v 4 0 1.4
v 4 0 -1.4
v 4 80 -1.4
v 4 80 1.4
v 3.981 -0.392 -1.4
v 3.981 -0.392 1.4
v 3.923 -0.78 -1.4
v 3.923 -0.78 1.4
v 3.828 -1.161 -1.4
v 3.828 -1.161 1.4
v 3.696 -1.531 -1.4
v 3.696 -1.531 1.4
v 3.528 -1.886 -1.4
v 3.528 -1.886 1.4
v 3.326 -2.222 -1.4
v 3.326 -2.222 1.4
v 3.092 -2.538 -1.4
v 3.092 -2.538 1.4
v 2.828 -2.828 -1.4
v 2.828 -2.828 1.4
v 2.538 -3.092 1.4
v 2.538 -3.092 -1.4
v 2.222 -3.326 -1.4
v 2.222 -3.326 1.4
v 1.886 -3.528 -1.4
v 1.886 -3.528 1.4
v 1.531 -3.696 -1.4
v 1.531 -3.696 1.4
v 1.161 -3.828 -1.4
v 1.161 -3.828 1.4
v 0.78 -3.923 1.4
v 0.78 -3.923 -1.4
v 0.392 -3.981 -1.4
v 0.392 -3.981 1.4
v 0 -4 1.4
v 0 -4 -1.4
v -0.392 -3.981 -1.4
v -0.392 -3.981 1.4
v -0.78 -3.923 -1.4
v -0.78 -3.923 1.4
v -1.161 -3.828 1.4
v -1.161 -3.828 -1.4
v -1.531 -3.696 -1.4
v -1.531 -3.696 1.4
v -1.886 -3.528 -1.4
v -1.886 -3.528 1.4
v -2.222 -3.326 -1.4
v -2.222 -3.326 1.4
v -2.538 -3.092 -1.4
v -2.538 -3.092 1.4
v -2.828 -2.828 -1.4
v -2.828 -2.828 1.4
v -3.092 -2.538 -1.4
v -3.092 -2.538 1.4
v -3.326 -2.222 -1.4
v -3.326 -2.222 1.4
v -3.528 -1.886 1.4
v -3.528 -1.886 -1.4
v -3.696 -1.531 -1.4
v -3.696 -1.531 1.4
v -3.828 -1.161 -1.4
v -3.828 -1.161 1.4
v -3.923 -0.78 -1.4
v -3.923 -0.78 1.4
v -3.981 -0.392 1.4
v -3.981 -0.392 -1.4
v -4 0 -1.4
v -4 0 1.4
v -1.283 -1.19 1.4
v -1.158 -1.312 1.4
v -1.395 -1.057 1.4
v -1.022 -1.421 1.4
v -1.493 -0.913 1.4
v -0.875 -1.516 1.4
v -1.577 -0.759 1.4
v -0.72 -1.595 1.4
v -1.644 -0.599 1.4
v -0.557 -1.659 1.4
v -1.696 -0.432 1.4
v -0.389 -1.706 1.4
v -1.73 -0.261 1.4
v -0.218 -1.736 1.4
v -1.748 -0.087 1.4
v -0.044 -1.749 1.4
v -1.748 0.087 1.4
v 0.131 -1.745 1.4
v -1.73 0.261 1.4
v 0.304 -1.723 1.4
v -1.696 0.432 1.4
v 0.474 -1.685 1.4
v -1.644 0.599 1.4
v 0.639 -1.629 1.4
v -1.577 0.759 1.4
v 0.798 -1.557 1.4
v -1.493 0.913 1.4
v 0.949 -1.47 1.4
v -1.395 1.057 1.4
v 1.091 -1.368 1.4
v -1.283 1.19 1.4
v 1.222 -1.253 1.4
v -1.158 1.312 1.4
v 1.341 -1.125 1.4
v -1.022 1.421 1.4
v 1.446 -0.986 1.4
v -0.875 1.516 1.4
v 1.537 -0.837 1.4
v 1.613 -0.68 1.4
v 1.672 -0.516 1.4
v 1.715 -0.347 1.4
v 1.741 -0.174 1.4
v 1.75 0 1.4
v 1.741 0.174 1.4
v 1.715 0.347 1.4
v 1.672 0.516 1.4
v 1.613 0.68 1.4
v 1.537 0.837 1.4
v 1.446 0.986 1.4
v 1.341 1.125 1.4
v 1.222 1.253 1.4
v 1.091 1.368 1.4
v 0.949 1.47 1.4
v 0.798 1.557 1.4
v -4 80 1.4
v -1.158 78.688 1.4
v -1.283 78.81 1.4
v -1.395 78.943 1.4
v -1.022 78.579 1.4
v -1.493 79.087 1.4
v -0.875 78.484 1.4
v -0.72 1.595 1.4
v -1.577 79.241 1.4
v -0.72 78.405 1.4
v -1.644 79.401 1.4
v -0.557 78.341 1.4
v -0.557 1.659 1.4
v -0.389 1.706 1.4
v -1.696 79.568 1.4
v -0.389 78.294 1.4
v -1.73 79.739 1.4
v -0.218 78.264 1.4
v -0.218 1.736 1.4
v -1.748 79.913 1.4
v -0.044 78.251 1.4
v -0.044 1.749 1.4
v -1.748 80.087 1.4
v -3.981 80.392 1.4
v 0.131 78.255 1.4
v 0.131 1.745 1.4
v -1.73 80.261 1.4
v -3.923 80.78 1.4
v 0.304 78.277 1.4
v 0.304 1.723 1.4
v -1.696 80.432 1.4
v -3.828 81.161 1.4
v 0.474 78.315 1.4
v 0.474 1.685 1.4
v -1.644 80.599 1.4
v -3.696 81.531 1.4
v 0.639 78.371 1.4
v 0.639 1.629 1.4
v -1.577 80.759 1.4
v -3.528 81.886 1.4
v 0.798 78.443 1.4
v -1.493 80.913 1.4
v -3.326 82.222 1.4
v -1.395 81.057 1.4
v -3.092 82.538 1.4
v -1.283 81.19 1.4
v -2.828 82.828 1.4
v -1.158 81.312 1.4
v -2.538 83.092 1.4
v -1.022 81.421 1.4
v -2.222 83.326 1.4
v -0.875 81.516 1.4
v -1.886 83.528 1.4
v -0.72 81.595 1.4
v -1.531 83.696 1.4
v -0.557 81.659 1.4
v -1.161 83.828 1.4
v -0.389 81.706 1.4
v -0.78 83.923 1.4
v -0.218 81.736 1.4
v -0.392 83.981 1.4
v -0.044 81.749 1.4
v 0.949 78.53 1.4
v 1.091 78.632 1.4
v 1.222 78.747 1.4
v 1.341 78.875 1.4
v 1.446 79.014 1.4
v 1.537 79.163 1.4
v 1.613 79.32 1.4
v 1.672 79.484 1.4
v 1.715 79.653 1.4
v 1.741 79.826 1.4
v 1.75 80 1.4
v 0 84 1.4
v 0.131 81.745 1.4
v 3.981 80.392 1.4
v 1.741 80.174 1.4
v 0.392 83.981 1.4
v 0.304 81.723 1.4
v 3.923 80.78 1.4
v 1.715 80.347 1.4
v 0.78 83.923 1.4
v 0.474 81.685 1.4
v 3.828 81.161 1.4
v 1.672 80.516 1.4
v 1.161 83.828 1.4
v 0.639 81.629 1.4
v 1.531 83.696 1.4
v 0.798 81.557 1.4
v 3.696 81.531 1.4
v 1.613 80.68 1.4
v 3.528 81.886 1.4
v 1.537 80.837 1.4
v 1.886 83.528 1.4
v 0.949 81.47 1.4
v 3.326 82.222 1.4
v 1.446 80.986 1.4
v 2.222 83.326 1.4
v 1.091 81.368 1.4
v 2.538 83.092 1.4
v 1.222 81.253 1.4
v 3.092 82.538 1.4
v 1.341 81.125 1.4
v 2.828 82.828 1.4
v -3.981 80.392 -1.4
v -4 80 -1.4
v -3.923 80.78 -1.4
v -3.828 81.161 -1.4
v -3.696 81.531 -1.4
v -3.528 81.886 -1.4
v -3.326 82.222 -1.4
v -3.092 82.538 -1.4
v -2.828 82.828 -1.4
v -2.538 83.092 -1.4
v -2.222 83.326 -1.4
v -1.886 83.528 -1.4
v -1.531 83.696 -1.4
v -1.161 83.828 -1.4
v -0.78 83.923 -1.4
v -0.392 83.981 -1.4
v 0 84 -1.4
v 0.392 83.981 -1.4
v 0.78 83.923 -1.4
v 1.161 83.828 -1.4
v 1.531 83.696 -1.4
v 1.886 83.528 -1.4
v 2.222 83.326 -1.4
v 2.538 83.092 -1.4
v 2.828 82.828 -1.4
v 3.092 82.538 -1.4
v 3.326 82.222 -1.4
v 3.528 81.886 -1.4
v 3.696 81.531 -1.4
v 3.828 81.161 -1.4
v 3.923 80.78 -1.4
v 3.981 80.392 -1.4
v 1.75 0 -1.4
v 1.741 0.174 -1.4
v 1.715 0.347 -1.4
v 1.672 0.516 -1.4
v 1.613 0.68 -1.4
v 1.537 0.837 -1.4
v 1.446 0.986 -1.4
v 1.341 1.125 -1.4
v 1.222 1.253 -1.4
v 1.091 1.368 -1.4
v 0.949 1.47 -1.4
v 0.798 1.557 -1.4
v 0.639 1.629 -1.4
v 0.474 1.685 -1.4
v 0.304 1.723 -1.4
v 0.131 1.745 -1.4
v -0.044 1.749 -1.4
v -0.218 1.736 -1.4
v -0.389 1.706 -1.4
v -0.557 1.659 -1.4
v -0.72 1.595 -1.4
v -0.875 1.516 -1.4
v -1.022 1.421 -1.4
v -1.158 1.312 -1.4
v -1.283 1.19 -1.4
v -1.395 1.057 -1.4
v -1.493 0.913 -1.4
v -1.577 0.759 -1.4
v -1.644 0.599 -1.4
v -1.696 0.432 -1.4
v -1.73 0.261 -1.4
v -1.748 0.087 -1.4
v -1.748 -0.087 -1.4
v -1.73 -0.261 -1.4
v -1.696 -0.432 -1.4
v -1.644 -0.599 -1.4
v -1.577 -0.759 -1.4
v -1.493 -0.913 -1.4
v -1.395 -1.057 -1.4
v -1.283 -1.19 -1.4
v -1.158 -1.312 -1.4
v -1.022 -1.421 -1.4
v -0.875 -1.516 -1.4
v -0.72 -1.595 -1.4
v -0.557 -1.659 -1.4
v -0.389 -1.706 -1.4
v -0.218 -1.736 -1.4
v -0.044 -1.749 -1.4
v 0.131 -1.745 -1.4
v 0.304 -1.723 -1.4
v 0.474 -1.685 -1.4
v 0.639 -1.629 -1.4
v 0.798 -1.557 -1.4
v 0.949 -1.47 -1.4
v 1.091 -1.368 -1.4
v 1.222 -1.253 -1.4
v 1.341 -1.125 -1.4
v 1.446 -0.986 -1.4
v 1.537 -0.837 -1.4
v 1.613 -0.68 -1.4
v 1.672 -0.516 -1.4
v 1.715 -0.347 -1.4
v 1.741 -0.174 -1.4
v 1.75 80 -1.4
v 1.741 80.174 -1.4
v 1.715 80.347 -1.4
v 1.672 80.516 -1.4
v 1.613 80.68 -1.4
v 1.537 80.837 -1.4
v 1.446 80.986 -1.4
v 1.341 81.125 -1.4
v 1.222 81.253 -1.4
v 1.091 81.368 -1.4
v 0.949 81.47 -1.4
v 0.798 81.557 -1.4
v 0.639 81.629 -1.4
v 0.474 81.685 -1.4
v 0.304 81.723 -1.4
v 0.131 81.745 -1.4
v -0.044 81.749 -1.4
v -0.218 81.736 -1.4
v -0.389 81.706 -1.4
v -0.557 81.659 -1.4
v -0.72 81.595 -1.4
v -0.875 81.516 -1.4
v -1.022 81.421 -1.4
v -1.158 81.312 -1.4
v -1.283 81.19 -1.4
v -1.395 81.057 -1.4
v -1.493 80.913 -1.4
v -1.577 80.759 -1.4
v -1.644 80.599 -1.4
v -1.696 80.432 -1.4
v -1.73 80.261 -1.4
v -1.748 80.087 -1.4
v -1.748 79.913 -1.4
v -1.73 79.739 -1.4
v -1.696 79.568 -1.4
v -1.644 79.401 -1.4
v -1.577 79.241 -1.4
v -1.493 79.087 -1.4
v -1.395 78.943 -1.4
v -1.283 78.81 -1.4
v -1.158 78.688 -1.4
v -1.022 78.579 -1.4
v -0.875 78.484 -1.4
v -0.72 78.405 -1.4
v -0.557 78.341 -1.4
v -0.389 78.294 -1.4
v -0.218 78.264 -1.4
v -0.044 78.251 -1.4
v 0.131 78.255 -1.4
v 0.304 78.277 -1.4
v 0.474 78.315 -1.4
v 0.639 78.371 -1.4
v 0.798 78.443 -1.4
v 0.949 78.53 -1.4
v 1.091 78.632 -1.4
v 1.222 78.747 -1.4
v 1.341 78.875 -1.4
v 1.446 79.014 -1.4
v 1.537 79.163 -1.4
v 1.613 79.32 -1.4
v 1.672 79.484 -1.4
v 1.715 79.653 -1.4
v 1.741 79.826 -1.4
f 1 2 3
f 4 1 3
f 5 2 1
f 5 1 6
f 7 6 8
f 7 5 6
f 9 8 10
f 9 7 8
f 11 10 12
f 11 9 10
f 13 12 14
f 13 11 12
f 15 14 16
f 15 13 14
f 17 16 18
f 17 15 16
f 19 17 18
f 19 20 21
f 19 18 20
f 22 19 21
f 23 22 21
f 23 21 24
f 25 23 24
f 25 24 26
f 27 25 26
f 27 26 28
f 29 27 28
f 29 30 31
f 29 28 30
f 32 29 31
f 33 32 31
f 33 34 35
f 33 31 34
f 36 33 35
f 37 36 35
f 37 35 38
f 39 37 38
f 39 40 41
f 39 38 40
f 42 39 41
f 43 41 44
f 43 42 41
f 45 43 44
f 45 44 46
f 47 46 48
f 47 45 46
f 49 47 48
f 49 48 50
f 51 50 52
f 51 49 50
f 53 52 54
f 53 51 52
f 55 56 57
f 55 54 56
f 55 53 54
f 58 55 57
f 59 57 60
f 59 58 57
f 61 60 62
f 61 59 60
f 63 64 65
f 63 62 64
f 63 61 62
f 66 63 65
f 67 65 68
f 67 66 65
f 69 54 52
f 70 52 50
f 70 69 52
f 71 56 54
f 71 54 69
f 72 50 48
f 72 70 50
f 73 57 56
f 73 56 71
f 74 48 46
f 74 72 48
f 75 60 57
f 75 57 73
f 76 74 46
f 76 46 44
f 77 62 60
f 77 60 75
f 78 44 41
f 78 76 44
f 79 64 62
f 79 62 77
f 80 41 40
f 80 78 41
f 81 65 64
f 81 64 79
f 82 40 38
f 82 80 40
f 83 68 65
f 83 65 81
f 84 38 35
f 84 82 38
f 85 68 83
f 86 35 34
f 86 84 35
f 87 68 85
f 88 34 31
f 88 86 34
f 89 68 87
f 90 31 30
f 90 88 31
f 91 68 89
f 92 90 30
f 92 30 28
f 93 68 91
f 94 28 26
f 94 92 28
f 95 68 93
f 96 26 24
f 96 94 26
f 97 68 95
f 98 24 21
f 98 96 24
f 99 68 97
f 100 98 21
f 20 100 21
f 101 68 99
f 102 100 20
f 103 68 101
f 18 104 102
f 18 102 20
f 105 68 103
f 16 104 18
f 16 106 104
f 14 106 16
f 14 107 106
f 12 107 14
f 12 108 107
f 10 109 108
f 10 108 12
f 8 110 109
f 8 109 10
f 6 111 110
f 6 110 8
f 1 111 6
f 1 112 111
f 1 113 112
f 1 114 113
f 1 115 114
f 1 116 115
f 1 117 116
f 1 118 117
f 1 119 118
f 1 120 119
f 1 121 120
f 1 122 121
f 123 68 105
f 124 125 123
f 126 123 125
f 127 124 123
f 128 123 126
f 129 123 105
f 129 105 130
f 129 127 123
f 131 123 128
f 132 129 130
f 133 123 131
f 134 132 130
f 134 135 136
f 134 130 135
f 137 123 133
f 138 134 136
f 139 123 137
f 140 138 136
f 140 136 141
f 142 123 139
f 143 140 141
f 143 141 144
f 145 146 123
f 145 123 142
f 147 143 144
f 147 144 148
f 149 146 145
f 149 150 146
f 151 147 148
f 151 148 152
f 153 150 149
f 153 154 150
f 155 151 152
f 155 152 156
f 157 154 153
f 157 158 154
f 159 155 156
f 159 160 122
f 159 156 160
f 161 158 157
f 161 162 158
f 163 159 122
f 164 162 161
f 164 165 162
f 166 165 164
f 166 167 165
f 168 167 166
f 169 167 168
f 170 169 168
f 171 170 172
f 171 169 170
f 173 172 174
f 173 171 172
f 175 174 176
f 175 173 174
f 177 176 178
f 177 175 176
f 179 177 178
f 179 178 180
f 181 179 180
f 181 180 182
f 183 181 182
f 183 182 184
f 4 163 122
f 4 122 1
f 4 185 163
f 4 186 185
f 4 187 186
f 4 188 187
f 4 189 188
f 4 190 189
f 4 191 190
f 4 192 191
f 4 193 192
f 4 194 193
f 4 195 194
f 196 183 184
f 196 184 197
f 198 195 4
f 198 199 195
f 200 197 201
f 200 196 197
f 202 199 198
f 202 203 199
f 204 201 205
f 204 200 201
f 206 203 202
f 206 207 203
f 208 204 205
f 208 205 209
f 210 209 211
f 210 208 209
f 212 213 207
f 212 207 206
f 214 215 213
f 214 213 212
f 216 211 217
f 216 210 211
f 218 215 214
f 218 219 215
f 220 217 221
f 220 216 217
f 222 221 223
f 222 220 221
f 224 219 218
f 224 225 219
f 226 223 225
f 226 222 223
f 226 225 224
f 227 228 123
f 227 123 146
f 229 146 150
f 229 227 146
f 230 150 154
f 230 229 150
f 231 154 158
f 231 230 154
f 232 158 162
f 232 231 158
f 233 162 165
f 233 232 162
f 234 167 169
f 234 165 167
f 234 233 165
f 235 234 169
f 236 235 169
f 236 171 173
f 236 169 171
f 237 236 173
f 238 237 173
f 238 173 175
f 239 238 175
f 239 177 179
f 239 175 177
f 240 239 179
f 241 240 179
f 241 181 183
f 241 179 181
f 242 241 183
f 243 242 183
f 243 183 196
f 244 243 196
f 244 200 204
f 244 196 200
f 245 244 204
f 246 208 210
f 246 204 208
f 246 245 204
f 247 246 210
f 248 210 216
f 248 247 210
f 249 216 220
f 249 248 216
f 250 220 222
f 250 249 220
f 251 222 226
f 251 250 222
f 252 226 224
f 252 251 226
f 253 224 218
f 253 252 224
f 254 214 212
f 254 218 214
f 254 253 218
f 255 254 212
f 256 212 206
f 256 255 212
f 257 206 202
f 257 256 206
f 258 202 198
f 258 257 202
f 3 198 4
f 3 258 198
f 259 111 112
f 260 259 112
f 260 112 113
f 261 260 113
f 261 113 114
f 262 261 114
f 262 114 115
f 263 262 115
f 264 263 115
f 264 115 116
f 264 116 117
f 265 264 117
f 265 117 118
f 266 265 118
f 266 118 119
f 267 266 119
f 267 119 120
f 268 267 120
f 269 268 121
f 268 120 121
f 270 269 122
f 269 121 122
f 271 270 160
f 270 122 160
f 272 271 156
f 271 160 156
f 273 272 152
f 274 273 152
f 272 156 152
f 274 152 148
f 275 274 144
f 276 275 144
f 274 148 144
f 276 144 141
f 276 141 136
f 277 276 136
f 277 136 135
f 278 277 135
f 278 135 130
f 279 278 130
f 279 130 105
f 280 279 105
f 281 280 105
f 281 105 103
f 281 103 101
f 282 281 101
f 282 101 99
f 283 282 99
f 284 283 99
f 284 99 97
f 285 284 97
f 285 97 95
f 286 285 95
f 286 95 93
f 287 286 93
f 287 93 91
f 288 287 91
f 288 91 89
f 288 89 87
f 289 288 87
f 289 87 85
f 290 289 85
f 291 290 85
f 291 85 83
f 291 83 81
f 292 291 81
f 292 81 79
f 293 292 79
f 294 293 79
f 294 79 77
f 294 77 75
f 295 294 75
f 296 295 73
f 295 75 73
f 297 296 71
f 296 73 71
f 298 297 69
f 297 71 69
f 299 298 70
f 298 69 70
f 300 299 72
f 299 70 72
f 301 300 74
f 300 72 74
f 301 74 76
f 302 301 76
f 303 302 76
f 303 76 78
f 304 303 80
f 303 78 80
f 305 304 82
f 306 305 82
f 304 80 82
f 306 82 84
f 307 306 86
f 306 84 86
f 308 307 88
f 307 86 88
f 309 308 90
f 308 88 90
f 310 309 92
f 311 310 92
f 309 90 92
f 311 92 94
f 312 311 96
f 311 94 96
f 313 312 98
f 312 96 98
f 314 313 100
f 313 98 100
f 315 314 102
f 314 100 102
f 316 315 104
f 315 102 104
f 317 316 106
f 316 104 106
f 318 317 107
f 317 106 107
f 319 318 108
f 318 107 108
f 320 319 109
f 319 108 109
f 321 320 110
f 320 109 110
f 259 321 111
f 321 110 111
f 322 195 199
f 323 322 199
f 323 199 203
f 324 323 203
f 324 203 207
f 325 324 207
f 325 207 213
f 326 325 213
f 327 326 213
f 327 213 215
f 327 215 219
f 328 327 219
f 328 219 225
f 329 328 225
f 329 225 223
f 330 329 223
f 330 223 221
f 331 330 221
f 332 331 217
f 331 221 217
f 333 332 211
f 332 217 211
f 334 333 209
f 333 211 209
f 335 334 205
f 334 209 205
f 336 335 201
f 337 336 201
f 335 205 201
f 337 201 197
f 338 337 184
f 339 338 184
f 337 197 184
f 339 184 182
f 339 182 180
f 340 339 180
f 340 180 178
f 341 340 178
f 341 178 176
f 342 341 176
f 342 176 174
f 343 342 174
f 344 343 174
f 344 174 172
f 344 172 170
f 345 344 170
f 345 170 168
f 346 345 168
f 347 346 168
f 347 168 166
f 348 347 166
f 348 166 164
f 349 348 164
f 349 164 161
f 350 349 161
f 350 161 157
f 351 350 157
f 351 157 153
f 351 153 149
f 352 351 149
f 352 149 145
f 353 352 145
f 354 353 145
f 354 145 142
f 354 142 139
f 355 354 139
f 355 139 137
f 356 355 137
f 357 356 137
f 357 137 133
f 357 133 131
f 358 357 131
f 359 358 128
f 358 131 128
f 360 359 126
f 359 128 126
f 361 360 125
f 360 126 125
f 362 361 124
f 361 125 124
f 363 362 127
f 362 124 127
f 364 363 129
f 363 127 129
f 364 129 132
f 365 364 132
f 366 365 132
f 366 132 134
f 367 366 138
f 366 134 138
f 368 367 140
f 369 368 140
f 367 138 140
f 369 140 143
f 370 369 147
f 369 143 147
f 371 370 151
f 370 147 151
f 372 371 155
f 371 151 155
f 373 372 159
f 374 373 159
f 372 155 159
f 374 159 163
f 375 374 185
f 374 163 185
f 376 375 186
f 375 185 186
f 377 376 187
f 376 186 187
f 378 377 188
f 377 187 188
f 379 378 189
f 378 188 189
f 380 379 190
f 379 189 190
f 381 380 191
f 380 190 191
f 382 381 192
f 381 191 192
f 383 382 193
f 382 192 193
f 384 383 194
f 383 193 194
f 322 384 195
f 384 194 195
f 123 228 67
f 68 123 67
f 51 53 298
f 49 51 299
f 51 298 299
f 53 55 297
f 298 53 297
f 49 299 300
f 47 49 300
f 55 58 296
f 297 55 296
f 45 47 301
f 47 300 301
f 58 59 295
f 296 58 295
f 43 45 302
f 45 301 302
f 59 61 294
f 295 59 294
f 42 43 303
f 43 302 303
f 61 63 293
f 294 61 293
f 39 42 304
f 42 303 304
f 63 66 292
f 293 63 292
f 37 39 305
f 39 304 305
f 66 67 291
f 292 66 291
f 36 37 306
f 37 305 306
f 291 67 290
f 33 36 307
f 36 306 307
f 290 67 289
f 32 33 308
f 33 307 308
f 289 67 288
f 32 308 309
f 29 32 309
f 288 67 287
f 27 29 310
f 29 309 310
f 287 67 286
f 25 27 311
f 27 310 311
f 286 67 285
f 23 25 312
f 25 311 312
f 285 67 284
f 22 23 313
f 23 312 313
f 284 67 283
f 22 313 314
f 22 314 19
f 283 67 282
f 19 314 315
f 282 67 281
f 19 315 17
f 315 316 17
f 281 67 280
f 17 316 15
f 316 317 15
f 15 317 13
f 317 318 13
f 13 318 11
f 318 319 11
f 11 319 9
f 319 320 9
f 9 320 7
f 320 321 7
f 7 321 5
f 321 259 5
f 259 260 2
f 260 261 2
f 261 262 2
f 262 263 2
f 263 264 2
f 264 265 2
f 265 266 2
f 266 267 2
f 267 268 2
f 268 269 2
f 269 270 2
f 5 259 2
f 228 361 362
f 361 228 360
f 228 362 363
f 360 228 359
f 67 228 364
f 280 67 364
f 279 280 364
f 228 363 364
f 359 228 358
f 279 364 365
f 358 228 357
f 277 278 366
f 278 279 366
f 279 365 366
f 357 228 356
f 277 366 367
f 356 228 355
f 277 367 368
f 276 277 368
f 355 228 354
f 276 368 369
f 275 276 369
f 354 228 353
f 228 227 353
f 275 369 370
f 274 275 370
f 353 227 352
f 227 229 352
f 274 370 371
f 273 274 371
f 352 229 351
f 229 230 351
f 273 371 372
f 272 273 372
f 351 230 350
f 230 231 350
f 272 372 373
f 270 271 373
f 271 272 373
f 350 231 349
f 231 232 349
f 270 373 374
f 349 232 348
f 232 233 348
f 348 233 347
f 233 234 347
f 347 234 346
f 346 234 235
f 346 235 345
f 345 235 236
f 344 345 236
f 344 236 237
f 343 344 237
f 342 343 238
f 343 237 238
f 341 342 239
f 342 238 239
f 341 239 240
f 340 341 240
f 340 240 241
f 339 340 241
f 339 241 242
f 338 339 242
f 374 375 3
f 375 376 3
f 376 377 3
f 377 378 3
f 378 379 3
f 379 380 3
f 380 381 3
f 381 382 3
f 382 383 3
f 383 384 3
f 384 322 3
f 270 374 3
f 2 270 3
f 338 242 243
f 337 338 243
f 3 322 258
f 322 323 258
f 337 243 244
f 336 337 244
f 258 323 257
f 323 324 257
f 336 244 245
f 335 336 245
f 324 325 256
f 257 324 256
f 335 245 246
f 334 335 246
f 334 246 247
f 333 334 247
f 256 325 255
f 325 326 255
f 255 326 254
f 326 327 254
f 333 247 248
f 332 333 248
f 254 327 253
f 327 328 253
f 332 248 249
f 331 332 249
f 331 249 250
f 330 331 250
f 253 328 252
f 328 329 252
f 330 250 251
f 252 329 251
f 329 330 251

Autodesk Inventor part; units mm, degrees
ref_plane "YZ Plane" through (0, 0, 0) normal (1, 0, 0) x (0, 1, 0)
ref_plane "XZ Plane" through (0, 0, 0) normal (0, 1, 0) x (-1, 0, 0)
ref_plane "XY Plane" through (0, 0, 0) normal (0, 0, 1) x (1, 0, 0)
sketch "Sketch1" plane through (0, 0, 0) normal (0, 0, 1) x (1, 0, 0)
  circle A0 centre (0, 0) radius 4
  line L0 (0, 0) -> (0, 80) construction
  line L1 (4, 0) -> (4, 80)
  line L2 (-4, 80) -> (-4, 0)
  arc A1 (-4, 0) -> (4, 0) centre (0, 0) ccw
  arc A2 (4, 80) -> (-4, 80) centre (0, 80) ccw
  point P0 (0, 40)
  dimension "d0" = 8
  dimension "d1" = 8
  dimension "d2" = 80
extrude "Extrusion1" add sketch "Sketch1" along normal mid plane 2.8
sketch "Sketch2" plane through (0, 0, 1.4) normal (0, 0, 1) x (1, 0, 0)
  arc A0 (4, 80) -> (-4, 80) centre (0, 80) ccw construction
  arc A1 (-4, 0) -> (4, 0) centre (0, 0) ccw construction
  circle A2 centre (0, 0) radius 1.75
  circle A3 centre (0, 80) radius 1.75
  line L0 (0, 12.7) -> (0, 5.7) construction
  line L1 (-1.3, 11.4) -> (-1.3, 7)
  line L2 (1.3, 7) -> (1.3, 11.4)
  arc A4 (1.3, 11.4) -> (-1.3, 11.4) centre (0, 11.4) ccw
  arc A5 (-1.3, 7) -> (1.3, 7) centre (0, 7) ccw
  point P0 (0, 9.2)
  dimension "d5" = 7
  dimension "d6" = 2.6
  dimension "d7" = 7
  dimension "d8" = 3.5
  dimension "d9" = 3.5
extrude "Extrusion2" cut sketch "Sketch2" against normal through all contours A2 | A3
